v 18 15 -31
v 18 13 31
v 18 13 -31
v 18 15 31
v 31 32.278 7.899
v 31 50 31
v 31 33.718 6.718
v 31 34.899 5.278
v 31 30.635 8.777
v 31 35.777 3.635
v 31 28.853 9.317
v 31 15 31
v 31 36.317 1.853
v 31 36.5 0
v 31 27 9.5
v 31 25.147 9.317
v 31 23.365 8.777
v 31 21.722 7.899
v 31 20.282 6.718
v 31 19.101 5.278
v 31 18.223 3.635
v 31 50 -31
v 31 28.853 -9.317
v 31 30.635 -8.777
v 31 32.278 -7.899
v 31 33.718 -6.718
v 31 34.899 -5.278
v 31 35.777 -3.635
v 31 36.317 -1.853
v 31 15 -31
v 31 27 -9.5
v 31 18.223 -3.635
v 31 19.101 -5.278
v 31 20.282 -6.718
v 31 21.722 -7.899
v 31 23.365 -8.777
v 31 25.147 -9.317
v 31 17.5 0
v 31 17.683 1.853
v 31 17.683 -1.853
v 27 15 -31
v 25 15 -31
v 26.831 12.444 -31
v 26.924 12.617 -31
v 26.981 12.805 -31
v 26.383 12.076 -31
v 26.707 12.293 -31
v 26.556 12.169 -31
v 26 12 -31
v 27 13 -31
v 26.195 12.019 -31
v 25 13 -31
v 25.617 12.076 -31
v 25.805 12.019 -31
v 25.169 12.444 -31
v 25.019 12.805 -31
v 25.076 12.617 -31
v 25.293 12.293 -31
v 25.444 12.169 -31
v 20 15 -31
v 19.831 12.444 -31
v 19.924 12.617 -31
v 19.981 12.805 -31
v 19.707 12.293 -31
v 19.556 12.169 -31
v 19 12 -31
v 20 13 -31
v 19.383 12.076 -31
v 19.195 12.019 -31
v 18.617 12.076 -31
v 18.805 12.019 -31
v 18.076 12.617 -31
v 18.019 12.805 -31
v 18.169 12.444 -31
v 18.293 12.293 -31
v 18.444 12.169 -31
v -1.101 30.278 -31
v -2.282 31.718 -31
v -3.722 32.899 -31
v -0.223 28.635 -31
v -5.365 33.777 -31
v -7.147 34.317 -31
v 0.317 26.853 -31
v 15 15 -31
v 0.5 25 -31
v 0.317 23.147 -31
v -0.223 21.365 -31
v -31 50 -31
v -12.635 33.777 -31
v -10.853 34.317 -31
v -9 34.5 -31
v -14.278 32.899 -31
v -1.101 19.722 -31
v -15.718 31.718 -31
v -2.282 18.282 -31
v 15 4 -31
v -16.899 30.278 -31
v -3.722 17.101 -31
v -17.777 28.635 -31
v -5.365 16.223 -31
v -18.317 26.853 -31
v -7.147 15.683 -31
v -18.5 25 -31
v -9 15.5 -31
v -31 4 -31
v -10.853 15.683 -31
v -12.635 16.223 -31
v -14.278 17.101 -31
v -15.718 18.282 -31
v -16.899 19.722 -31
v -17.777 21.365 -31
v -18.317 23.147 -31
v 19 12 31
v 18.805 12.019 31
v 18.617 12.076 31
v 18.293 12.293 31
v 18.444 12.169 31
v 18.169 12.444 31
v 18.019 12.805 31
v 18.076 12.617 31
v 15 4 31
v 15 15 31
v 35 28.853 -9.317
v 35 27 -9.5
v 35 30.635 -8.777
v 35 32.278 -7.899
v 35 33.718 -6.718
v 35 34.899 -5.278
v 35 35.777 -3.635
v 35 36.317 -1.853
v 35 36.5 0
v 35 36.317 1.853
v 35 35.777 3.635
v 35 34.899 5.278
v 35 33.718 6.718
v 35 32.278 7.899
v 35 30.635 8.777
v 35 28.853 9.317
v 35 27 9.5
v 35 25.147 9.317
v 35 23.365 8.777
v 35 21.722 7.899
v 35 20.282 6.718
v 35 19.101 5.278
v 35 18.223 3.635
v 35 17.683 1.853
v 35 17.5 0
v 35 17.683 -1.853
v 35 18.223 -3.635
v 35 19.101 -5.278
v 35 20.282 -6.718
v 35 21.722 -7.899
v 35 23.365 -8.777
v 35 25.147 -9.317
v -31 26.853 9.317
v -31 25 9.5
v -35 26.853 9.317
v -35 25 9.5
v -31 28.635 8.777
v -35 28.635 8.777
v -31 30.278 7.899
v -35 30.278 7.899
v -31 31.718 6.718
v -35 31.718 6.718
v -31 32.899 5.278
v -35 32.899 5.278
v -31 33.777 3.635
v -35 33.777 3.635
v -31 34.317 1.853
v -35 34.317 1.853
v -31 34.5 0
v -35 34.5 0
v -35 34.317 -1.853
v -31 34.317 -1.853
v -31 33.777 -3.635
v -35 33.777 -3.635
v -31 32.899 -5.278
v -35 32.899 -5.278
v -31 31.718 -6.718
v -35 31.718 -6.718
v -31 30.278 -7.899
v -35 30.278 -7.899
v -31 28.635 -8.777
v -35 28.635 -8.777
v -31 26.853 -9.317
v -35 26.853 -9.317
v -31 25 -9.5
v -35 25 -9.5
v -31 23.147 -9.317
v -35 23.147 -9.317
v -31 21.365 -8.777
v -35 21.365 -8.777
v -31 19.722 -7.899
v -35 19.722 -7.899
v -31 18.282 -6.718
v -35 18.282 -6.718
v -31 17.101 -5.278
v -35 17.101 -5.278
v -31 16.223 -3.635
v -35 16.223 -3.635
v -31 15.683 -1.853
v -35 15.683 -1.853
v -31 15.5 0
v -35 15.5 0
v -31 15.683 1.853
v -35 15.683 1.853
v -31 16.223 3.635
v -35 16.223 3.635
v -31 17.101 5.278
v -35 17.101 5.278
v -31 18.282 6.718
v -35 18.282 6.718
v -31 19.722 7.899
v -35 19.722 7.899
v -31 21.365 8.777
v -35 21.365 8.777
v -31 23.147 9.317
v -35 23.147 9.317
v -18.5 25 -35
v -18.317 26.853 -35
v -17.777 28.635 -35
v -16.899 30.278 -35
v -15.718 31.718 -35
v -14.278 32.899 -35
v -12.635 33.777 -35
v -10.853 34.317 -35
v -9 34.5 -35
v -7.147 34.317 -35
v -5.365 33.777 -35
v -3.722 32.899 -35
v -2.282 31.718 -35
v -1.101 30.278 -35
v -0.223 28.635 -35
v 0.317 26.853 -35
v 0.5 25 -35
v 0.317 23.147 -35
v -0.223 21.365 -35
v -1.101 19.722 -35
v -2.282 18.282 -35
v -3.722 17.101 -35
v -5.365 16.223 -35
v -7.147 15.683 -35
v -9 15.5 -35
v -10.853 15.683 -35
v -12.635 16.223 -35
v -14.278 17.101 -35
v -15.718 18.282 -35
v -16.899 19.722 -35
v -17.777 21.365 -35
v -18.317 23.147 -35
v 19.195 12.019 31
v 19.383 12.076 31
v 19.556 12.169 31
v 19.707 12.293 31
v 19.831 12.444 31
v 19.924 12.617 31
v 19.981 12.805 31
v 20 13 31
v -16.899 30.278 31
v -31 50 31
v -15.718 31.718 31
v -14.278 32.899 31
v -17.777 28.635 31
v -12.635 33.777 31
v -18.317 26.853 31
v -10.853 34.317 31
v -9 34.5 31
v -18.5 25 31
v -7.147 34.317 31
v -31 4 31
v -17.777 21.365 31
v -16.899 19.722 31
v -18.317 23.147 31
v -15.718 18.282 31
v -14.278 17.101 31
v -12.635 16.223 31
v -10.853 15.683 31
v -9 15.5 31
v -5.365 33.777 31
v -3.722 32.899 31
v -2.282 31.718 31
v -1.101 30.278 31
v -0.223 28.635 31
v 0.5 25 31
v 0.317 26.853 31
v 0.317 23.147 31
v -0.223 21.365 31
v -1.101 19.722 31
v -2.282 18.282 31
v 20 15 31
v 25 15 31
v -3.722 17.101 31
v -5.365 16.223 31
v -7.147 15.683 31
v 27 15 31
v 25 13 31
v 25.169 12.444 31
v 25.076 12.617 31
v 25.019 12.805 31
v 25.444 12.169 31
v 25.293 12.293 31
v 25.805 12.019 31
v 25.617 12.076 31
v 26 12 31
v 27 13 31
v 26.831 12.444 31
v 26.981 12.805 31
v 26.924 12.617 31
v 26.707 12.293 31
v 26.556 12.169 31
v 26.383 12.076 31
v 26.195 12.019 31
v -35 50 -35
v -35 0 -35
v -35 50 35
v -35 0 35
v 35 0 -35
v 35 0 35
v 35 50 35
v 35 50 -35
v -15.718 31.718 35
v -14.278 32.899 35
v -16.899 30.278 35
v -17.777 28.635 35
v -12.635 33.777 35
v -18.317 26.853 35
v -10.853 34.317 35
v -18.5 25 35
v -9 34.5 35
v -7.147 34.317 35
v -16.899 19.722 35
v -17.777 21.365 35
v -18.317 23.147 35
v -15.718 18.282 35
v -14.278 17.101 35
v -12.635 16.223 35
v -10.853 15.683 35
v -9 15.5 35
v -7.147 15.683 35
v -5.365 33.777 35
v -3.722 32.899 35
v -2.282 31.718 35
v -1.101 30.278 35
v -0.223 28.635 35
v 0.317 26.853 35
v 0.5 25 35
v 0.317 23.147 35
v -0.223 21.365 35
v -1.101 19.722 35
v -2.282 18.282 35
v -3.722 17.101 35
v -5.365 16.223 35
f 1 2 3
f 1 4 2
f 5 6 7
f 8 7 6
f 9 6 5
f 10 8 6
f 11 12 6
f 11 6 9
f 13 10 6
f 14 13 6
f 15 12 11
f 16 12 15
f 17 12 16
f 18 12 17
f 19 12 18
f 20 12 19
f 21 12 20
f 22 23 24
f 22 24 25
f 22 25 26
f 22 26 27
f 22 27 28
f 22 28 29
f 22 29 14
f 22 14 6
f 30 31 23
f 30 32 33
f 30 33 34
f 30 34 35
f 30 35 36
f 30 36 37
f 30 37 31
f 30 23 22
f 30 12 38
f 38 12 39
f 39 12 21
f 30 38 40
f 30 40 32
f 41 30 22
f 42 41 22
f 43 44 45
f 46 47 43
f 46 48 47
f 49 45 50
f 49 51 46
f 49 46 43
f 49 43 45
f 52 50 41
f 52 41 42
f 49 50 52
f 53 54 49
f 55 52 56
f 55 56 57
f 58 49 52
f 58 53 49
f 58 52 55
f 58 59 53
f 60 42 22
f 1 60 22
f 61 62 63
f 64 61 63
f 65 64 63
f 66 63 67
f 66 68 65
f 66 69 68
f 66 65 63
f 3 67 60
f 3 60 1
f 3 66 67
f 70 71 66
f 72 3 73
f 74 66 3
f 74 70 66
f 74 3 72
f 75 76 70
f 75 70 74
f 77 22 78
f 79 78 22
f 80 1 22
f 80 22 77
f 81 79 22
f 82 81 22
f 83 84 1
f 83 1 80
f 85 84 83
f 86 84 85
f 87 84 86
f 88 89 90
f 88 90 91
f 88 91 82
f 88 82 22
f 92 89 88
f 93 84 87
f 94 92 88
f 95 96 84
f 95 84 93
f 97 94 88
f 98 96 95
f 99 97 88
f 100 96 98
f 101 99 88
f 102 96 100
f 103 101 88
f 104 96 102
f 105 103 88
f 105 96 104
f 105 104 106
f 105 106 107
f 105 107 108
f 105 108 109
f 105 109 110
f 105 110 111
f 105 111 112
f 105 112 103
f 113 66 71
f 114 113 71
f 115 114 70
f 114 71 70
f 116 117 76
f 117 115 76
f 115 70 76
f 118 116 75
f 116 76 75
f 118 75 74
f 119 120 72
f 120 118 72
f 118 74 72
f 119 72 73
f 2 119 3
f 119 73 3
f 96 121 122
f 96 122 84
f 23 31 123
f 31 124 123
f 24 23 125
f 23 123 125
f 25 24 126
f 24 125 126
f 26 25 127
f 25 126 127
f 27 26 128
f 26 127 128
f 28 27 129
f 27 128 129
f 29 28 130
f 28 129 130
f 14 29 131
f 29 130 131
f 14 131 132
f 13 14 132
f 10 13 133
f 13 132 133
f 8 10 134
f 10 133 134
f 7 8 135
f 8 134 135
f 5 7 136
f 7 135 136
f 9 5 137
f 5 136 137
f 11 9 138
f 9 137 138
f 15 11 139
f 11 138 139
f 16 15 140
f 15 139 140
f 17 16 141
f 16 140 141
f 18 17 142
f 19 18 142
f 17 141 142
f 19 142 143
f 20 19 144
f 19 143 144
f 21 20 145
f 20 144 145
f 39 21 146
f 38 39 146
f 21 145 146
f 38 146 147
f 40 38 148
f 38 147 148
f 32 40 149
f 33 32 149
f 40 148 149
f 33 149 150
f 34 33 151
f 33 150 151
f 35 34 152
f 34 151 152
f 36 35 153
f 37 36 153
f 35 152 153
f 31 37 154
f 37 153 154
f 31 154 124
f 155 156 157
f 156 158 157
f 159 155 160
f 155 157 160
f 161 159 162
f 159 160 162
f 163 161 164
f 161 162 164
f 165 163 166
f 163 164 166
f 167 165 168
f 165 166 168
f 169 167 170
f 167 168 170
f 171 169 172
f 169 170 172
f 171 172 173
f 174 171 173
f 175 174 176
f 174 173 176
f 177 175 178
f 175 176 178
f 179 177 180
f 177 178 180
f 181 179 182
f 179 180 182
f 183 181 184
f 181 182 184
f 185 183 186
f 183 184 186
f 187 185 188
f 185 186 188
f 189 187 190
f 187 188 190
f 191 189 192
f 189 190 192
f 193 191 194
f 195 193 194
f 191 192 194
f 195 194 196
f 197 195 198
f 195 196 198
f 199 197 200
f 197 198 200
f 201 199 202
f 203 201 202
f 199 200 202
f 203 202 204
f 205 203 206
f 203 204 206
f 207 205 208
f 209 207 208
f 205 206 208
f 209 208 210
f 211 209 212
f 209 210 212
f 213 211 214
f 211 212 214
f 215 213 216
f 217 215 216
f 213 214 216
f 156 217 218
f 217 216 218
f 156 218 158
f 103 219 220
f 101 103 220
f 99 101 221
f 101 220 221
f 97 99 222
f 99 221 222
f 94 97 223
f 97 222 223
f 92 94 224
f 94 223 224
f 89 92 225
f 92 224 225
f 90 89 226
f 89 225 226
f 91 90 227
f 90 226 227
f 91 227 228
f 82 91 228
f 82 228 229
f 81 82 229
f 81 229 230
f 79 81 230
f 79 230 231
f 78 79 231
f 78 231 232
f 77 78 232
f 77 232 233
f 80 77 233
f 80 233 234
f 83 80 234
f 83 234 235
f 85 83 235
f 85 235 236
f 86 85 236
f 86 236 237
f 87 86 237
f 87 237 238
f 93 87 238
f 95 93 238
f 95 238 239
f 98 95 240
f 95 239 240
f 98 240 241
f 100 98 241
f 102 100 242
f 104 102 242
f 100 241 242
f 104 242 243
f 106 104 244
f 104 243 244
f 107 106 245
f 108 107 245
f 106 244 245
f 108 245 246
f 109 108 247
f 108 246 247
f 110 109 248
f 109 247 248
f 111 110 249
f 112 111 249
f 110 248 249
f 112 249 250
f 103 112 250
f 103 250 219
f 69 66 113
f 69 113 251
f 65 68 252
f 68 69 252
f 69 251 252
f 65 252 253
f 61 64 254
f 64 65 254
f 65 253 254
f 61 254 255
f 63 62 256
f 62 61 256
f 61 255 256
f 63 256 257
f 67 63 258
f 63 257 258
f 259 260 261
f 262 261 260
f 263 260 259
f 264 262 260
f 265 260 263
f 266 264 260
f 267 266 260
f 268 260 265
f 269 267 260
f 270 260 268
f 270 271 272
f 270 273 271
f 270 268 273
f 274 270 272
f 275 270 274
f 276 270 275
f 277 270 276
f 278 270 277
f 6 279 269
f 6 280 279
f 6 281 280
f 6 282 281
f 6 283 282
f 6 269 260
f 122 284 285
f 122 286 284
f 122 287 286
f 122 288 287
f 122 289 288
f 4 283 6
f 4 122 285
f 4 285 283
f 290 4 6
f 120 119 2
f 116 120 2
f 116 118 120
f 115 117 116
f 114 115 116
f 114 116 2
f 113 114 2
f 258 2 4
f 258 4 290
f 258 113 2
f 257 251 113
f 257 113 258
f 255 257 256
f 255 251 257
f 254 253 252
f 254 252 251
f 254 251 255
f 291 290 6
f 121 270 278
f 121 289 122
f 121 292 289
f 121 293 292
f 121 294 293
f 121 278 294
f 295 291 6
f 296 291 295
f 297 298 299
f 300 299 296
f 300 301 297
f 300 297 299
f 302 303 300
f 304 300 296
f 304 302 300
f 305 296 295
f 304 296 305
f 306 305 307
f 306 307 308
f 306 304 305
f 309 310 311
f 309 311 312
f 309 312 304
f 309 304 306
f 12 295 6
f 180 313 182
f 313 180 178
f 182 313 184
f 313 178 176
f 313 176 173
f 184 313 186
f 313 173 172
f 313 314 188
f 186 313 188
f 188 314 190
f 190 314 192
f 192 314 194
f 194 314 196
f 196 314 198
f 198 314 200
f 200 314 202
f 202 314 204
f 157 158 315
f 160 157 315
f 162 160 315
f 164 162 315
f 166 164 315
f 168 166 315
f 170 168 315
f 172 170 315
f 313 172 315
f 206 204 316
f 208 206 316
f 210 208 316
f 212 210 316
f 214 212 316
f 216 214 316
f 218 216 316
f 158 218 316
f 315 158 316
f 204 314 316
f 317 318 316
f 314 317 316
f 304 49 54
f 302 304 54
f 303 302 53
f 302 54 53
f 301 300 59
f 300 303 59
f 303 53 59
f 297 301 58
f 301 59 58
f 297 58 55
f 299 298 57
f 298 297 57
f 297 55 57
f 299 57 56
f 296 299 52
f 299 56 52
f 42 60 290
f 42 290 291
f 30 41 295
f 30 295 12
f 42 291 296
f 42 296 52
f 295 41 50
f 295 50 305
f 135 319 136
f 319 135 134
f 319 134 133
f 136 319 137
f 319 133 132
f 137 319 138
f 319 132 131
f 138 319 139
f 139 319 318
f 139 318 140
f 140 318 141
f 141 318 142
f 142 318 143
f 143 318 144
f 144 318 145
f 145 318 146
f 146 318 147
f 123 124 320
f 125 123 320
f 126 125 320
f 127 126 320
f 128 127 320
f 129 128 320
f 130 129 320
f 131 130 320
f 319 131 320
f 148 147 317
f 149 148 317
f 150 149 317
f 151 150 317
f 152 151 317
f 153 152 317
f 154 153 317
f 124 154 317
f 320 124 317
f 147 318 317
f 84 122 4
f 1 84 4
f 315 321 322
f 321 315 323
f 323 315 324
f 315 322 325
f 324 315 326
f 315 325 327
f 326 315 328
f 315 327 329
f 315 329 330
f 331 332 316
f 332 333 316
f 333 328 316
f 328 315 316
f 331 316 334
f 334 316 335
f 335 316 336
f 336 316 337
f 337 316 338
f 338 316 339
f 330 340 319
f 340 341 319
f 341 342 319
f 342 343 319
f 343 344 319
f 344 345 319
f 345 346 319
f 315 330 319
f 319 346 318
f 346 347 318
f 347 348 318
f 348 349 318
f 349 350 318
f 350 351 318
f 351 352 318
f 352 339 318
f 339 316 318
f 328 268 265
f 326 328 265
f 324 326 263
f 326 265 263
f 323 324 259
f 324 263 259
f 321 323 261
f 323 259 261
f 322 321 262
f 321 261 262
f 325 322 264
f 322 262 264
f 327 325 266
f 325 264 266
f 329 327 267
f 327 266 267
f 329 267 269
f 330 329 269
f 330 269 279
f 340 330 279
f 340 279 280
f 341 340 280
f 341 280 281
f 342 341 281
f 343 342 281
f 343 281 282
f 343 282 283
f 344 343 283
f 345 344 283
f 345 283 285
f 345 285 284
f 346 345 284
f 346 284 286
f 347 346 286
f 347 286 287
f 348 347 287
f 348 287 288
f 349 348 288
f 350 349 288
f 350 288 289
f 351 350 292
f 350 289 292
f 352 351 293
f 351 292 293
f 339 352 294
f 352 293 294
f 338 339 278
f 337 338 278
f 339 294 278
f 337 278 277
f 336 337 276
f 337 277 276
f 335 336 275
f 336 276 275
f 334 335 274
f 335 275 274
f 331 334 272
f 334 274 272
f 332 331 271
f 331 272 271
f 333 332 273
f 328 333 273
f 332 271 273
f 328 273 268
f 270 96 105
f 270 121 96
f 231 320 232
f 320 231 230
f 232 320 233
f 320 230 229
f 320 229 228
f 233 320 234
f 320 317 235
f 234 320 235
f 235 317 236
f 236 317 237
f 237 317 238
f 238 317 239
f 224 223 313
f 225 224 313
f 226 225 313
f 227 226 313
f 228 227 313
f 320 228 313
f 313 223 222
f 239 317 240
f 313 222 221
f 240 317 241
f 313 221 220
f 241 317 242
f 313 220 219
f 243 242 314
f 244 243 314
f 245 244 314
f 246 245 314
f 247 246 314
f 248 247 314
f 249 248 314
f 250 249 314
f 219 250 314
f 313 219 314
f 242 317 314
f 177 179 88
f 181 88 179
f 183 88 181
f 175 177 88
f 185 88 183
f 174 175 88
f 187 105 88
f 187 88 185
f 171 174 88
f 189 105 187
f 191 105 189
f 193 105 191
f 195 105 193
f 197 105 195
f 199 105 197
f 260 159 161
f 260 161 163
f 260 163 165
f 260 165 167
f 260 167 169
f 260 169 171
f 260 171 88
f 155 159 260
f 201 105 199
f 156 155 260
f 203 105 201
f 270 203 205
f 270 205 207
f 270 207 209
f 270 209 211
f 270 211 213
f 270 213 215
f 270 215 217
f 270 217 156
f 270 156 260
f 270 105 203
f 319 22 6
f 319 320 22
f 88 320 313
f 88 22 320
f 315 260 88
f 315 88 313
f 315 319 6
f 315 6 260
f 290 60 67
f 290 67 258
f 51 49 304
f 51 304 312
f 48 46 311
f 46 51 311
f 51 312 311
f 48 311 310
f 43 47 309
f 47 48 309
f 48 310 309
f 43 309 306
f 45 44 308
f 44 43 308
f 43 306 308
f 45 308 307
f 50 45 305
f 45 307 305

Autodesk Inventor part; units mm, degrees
ref_plane "YZ Plane" through (0, 0, 0) normal (1, 0, 0) x (0, 1, 0)
ref_plane "XZ Plane" through (0, 0, 0) normal (0, 1, 0) x (-1, 0, 0)
ref_plane "XY Plane" through (0, 0, 0) normal (0, 0, 1) x (1, 0, 0)
sketch "Skizze1" plane through (0, 0, 0) normal (0, 1, 0) x (-1, 0, 0)
  line L0 (35, 35) -> (-35, 35)
  line L1 (-35, 35) -> (-35, -35)
  line L2 (-35, -35) -> (35, -35)
  line L3 (35, -35) -> (35, 35)
  line L4 (0, 35) -> (0, -35) construction
  line L5 (35, 0) -> (-35, 0) construction
  point P0 (0, 0)
  point P1 (0, 0)
  dimension "d0" = 70
  dimension "d1" = 70
extrude "Extrusion1" add sketch "Skizze1" along normal blind 50
shell "Wandung1" thickness 4 removed faces 1 at (11.6667, 50, -11.6667)
sketch "Skizze2" plane through (35, 0, 35) normal (1, 0, 0) x (0, 0, -1)
  circle A0 centre (35, 27) radius 9.5
  line L0 (0, 0) -> (0, 50) construction
  line L1 (0, 0) -> (70, 0) construction
  line L2 (0, 50) -> (70, 0) construction
  line L3 (0, 50) -> (70, 50) construction
  line L4 (70, 50) -> (0, 0) construction
  point P0 (35, 0)
  point P1 (35, 25)
  point P2 (35, 25)
  dimension "d5" = 19
  dimension "d27" = 2
sketch "Skizze3" plane through (35, 0, -35) normal (0, 0, -1) x (-1, 0, 0)
  circle A0 centre (44, 25) radius 9.5
  line L0 (0, 0) -> (0, 50) construction
  line L1 (70, 0) -> (70, 50) construction
  line L2 (0, 50) -> (70, 0) construction
  line L3 (0, 50) -> (70, 50) construction
  line L4 (0, 0) -> (70, 50) construction
  point P0 (35, 0)
  point P1 (35, 25)
  point P2 (35, 25)
  dimension "d6" = 19
  dimension "d11" = 9
extrude "Extrusion2" cut sketch "Skizze3" against normal blind 95.5
extrude "Extrusion3" cut sketch "Skizze2" against normal blind 10
sketch "Skizze4" plane through (-31, 4, -31) normal (0, 1, 0) x (1, 0, 0)
  line L0 (62, -62) -> (0, -62) projected
  line L1 (62, 0) -> (0, 0) projected
  line L2 (62, -62) -> (46, -62)
  line L3 (46, -62) -> (46, 0)
  line L4 (46, 0) -> (62, 0)
  line L5 (62, 0) -> (62, -62)
  point P0 (31, -31)
  dimension "d12" = 16
extrude "Extrusion4" add sketch "Skizze4" along normal blind 11
sketch "Skizze5" plane through (-31, 15, -31) normal (0, 1, 0) x (1, 0, 0)
  line L0 (62, -62) -> (46, -62) projected
  line L1 (0, 0) -> (62, 0) projected
  line L2 (58, -62) -> (56, -62)
  line L3 (56, -62) -> (56, 0)
  line L4 (56, 0) -> (58, 0)
  line L5 (58, 0) -> (58, -62)
  line L6 (51, -62) -> (49, -62)
  line L7 (49, -62) -> (49, 0)
  line L8 (49, 0) -> (51, 0)
  line L9 (51, 0) -> (51, -62)
  line L10 (62, 0) -> (62, -62) projected
  line L11 (46, 0) -> (46, -62) projected
  line L12 (53.5, -62) -> (53.5, 0) construction
  point P0 (31, -31)
  point P1 (51, 0)
  point P2 (49, 0)
  point P3 (58, 0)
  dimension "d15" = 2
  dimension "d19" = 7.5
  dimension "d20" = 5
extrude "Extrusion5" cut sketch "Skizze5" against normal blind 3 contours L0 L3 L1 L5 | L0 L7 L1 L9
fillet "Rundung1" radius 1 4 edges at (27, 12, 0) (25, 12, 0) (20, 12, 0) (18, 12, 0)
sketch "Skizze6" plane through (-35, 0, -35) normal (-1, 0, 0) x (0, 0, 1)
  line L0 (70, 0) -> (70, 50) construction
  line L1 (70, 50) -> (0, 0) construction
  line L2 (0, 0) -> (70, 0) construction
  line L3 (70, 0) -> (0, 50) construction
  circle A0 centre (35, 25) radius 9.5
  point P0 (35, 0)
  dimension "d24" = 19
extrude "Extrusion6" cut sketch "Skizze6" against normal blind 10
properties part number "Hülle"
